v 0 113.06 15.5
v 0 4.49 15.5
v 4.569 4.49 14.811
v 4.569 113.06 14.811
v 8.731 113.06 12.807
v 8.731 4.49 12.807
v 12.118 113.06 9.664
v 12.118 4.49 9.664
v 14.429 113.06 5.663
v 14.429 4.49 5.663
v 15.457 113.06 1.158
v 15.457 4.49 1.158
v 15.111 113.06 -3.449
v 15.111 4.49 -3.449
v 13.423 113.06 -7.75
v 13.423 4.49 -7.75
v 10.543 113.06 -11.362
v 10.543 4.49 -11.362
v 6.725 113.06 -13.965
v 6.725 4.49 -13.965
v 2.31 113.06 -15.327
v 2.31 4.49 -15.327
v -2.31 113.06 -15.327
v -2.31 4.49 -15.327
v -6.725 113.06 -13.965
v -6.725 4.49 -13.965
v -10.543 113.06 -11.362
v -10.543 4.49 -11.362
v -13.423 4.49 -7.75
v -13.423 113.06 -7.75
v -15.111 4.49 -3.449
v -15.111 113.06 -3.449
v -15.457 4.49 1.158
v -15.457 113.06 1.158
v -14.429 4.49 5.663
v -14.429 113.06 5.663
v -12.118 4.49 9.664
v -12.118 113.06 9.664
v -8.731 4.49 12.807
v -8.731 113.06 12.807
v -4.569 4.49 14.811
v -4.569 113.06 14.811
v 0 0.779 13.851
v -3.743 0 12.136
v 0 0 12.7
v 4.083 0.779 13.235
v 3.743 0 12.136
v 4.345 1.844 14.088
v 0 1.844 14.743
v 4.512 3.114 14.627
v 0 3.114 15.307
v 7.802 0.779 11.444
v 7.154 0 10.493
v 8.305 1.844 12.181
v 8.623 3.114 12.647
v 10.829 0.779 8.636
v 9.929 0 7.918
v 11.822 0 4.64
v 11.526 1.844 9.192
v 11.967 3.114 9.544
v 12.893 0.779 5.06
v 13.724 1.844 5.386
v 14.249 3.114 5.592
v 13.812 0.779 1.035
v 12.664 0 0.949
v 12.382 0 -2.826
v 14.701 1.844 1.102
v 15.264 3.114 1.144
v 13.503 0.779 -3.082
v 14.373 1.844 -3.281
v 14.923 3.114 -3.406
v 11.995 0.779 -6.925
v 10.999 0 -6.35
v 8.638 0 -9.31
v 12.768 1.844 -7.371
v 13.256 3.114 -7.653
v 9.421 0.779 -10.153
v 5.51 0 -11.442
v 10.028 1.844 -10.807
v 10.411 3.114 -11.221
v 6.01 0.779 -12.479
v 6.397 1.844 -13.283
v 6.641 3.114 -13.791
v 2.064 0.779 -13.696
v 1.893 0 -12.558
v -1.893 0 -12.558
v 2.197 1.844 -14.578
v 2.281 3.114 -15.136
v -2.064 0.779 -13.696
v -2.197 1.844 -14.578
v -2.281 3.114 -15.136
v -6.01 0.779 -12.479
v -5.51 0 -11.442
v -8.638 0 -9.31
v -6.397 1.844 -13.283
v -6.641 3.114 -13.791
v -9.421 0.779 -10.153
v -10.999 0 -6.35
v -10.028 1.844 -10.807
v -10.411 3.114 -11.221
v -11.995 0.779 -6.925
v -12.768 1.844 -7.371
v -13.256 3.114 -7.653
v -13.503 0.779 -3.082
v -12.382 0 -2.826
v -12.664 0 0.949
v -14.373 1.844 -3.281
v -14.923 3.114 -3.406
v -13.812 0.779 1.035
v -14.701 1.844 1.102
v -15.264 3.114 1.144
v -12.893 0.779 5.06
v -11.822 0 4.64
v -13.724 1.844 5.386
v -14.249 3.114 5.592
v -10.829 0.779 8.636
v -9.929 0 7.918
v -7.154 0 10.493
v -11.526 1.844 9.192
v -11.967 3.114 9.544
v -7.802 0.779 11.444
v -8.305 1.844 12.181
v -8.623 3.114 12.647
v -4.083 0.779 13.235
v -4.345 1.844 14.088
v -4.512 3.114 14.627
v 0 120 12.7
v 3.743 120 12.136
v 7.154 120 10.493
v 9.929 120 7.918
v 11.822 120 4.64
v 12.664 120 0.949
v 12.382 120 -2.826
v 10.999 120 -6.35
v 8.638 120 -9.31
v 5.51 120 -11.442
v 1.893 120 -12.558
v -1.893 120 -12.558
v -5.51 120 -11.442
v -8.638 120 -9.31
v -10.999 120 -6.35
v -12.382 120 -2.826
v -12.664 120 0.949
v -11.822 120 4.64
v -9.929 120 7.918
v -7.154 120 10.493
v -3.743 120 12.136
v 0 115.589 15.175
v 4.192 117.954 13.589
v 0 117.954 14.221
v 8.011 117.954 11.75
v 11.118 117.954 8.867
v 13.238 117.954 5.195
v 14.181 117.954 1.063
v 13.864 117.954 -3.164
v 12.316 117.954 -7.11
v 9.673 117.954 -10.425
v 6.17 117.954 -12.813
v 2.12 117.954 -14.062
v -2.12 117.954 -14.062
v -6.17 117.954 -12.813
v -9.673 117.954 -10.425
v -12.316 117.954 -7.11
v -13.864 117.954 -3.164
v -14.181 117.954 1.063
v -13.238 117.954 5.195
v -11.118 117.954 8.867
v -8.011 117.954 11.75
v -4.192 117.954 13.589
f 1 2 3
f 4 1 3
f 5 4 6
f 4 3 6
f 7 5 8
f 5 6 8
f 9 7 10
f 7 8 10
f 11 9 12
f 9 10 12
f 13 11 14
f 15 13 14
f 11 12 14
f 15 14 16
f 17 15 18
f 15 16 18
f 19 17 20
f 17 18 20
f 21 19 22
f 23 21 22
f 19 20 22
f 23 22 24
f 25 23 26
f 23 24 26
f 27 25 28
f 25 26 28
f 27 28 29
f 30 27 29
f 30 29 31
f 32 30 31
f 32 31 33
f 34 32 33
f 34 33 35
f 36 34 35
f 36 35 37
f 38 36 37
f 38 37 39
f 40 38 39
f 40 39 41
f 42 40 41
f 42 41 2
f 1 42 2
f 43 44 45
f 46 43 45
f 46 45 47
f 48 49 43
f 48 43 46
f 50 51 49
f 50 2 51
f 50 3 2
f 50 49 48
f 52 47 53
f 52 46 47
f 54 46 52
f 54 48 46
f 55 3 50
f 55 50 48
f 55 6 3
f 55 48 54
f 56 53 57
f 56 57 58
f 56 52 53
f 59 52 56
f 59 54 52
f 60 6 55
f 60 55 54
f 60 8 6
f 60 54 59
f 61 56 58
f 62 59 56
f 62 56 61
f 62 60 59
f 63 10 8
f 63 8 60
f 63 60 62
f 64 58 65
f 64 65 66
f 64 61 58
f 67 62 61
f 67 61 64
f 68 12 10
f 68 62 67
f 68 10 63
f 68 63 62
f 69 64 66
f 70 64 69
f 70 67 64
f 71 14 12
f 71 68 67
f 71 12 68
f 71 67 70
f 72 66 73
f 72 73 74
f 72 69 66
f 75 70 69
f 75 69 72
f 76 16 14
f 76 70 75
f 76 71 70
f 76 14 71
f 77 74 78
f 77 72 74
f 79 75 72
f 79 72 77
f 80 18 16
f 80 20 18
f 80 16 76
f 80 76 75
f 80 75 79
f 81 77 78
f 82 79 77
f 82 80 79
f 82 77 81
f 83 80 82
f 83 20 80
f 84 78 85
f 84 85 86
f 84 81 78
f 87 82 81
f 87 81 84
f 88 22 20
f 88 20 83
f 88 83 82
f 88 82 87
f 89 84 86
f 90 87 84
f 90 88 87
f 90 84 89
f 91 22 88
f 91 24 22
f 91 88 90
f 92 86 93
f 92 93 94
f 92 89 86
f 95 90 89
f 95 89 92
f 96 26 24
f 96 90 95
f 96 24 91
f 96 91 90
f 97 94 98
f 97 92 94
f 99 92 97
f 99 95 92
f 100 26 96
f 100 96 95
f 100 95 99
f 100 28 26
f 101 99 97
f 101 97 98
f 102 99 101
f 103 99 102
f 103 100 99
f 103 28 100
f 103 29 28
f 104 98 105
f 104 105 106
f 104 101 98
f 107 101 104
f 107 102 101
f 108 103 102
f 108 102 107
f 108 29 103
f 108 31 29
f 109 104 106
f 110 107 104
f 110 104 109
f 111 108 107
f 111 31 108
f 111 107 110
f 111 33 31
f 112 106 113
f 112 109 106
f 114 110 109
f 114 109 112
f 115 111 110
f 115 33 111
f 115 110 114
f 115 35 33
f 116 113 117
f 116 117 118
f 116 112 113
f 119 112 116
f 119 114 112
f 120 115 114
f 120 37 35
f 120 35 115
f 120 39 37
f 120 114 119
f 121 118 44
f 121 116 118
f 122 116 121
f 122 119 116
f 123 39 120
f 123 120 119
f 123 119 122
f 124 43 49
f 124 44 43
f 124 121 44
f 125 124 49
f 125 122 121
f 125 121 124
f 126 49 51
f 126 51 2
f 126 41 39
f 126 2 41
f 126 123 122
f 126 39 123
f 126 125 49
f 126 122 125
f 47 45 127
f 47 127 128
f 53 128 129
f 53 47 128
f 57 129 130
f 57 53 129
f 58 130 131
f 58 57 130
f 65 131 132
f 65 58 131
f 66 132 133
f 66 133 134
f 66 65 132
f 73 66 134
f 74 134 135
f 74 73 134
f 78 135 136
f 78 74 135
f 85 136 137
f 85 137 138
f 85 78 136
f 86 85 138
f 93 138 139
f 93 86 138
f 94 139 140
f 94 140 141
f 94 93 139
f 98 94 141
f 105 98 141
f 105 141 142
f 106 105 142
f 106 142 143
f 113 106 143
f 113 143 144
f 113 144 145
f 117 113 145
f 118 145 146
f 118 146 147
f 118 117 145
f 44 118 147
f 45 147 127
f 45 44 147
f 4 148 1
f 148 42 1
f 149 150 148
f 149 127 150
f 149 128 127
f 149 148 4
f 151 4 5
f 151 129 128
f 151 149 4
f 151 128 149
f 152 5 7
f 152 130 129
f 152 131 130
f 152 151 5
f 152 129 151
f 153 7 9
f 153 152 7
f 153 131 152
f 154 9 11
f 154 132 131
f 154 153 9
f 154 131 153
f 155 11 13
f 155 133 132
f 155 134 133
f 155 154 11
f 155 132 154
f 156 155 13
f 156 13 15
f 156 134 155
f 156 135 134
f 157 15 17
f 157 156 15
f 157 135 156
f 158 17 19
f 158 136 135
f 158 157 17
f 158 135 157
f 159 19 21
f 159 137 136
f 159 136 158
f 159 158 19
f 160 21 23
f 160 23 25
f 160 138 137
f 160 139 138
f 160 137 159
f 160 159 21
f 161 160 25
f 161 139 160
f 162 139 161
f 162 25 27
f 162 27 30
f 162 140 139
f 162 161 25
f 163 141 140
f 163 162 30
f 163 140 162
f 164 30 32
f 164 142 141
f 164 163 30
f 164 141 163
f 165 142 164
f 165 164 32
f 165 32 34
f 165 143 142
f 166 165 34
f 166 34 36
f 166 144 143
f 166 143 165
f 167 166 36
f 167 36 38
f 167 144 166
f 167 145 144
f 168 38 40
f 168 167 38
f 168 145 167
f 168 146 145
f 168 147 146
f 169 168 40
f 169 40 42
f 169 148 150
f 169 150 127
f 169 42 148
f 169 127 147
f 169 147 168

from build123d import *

# Parameters (mm, degrees)
SKETCH3_R           = 15.5
SKETCH3_R_2         = 12.7
BOSS_EXTRUDE5_DEPTH = 120
FILLET5_R           = 10
FILLET6_R           = 5


with BuildPart() as part:
    # Sketch3 → Boss-Extrude5 (new body)
    with BuildSketch(Plane(origin=(0, 0, 0), x_dir=(1, 0, 0), z_dir=(0, 1, 0))):
        with Locations(Location((0, 0, 0), (0, 0, 270))):
            Circle(SKETCH3_R)
        with Locations(Location((0, 0, 0), (0, 0, 270))):
            Circle(SKETCH3_R_2, mode=Mode.SUBTRACT)
    extrude(amount=BOSS_EXTRUDE5_DEPTH)

    # Fillet5
    # the kernel refuses this fillet: 10 mm, written as the material it takes off along each edge
    with BuildSketch(Plane(origin=(0, 120, 0), x_dir=(0, 0, 1), z_dir=(-1, 0, 0))) as fillet5_piece_1:
        with BuildLine():
            CenterArc((5.5, -6.939740629), FILLET5_R, 0, 43.945519562)
            Line((12.7, 0), (12.844, 0.138794813))
            ThreePointArc((12.844, 0.138794813), (14.1, 0.2), (15.5, 0.2))
            Line((15.5, 0.2), (15.7, 0))
            Line((15.7, 0), (15.7, -6.939740629))
            Line((15.7, -6.939740629), (15.5, -6.939740629))
        make_face()
    revolve(axis=Axis((0, 120, 0), (0, 1, 0)), mode=Mode.SUBTRACT)

    # Fillet6
    # the kernel refuses this fillet: 5 mm, written as the material it takes off along each edge
    with BuildSketch(Plane(origin=(0, 0, 0), x_dir=(0, 0, 1), z_dir=(-1, 0, 0))) as fillet6_piece_1:
        with BuildLine():
            CenterArc((10.5, 4.489988864), FILLET6_R, 296.103881137, 63.896118863)
            Line((12.7, 0), (12.744, -0.089799777))
            ThreePointArc((12.744, -0.089799777), (14.1, -0.1), (15.5, -0.1))
            Line((15.5, -0.1), (15.6, 0))
            Line((15.6, 0), (15.6, 4.489988864))
            Line((15.6, 4.489988864), (15.5, 4.489988864))
        make_face()
    revolve(axis=Axis((0, 0, 0), (0, 1, 0)), mode=Mode.SUBTRACT)


solid = part.part
